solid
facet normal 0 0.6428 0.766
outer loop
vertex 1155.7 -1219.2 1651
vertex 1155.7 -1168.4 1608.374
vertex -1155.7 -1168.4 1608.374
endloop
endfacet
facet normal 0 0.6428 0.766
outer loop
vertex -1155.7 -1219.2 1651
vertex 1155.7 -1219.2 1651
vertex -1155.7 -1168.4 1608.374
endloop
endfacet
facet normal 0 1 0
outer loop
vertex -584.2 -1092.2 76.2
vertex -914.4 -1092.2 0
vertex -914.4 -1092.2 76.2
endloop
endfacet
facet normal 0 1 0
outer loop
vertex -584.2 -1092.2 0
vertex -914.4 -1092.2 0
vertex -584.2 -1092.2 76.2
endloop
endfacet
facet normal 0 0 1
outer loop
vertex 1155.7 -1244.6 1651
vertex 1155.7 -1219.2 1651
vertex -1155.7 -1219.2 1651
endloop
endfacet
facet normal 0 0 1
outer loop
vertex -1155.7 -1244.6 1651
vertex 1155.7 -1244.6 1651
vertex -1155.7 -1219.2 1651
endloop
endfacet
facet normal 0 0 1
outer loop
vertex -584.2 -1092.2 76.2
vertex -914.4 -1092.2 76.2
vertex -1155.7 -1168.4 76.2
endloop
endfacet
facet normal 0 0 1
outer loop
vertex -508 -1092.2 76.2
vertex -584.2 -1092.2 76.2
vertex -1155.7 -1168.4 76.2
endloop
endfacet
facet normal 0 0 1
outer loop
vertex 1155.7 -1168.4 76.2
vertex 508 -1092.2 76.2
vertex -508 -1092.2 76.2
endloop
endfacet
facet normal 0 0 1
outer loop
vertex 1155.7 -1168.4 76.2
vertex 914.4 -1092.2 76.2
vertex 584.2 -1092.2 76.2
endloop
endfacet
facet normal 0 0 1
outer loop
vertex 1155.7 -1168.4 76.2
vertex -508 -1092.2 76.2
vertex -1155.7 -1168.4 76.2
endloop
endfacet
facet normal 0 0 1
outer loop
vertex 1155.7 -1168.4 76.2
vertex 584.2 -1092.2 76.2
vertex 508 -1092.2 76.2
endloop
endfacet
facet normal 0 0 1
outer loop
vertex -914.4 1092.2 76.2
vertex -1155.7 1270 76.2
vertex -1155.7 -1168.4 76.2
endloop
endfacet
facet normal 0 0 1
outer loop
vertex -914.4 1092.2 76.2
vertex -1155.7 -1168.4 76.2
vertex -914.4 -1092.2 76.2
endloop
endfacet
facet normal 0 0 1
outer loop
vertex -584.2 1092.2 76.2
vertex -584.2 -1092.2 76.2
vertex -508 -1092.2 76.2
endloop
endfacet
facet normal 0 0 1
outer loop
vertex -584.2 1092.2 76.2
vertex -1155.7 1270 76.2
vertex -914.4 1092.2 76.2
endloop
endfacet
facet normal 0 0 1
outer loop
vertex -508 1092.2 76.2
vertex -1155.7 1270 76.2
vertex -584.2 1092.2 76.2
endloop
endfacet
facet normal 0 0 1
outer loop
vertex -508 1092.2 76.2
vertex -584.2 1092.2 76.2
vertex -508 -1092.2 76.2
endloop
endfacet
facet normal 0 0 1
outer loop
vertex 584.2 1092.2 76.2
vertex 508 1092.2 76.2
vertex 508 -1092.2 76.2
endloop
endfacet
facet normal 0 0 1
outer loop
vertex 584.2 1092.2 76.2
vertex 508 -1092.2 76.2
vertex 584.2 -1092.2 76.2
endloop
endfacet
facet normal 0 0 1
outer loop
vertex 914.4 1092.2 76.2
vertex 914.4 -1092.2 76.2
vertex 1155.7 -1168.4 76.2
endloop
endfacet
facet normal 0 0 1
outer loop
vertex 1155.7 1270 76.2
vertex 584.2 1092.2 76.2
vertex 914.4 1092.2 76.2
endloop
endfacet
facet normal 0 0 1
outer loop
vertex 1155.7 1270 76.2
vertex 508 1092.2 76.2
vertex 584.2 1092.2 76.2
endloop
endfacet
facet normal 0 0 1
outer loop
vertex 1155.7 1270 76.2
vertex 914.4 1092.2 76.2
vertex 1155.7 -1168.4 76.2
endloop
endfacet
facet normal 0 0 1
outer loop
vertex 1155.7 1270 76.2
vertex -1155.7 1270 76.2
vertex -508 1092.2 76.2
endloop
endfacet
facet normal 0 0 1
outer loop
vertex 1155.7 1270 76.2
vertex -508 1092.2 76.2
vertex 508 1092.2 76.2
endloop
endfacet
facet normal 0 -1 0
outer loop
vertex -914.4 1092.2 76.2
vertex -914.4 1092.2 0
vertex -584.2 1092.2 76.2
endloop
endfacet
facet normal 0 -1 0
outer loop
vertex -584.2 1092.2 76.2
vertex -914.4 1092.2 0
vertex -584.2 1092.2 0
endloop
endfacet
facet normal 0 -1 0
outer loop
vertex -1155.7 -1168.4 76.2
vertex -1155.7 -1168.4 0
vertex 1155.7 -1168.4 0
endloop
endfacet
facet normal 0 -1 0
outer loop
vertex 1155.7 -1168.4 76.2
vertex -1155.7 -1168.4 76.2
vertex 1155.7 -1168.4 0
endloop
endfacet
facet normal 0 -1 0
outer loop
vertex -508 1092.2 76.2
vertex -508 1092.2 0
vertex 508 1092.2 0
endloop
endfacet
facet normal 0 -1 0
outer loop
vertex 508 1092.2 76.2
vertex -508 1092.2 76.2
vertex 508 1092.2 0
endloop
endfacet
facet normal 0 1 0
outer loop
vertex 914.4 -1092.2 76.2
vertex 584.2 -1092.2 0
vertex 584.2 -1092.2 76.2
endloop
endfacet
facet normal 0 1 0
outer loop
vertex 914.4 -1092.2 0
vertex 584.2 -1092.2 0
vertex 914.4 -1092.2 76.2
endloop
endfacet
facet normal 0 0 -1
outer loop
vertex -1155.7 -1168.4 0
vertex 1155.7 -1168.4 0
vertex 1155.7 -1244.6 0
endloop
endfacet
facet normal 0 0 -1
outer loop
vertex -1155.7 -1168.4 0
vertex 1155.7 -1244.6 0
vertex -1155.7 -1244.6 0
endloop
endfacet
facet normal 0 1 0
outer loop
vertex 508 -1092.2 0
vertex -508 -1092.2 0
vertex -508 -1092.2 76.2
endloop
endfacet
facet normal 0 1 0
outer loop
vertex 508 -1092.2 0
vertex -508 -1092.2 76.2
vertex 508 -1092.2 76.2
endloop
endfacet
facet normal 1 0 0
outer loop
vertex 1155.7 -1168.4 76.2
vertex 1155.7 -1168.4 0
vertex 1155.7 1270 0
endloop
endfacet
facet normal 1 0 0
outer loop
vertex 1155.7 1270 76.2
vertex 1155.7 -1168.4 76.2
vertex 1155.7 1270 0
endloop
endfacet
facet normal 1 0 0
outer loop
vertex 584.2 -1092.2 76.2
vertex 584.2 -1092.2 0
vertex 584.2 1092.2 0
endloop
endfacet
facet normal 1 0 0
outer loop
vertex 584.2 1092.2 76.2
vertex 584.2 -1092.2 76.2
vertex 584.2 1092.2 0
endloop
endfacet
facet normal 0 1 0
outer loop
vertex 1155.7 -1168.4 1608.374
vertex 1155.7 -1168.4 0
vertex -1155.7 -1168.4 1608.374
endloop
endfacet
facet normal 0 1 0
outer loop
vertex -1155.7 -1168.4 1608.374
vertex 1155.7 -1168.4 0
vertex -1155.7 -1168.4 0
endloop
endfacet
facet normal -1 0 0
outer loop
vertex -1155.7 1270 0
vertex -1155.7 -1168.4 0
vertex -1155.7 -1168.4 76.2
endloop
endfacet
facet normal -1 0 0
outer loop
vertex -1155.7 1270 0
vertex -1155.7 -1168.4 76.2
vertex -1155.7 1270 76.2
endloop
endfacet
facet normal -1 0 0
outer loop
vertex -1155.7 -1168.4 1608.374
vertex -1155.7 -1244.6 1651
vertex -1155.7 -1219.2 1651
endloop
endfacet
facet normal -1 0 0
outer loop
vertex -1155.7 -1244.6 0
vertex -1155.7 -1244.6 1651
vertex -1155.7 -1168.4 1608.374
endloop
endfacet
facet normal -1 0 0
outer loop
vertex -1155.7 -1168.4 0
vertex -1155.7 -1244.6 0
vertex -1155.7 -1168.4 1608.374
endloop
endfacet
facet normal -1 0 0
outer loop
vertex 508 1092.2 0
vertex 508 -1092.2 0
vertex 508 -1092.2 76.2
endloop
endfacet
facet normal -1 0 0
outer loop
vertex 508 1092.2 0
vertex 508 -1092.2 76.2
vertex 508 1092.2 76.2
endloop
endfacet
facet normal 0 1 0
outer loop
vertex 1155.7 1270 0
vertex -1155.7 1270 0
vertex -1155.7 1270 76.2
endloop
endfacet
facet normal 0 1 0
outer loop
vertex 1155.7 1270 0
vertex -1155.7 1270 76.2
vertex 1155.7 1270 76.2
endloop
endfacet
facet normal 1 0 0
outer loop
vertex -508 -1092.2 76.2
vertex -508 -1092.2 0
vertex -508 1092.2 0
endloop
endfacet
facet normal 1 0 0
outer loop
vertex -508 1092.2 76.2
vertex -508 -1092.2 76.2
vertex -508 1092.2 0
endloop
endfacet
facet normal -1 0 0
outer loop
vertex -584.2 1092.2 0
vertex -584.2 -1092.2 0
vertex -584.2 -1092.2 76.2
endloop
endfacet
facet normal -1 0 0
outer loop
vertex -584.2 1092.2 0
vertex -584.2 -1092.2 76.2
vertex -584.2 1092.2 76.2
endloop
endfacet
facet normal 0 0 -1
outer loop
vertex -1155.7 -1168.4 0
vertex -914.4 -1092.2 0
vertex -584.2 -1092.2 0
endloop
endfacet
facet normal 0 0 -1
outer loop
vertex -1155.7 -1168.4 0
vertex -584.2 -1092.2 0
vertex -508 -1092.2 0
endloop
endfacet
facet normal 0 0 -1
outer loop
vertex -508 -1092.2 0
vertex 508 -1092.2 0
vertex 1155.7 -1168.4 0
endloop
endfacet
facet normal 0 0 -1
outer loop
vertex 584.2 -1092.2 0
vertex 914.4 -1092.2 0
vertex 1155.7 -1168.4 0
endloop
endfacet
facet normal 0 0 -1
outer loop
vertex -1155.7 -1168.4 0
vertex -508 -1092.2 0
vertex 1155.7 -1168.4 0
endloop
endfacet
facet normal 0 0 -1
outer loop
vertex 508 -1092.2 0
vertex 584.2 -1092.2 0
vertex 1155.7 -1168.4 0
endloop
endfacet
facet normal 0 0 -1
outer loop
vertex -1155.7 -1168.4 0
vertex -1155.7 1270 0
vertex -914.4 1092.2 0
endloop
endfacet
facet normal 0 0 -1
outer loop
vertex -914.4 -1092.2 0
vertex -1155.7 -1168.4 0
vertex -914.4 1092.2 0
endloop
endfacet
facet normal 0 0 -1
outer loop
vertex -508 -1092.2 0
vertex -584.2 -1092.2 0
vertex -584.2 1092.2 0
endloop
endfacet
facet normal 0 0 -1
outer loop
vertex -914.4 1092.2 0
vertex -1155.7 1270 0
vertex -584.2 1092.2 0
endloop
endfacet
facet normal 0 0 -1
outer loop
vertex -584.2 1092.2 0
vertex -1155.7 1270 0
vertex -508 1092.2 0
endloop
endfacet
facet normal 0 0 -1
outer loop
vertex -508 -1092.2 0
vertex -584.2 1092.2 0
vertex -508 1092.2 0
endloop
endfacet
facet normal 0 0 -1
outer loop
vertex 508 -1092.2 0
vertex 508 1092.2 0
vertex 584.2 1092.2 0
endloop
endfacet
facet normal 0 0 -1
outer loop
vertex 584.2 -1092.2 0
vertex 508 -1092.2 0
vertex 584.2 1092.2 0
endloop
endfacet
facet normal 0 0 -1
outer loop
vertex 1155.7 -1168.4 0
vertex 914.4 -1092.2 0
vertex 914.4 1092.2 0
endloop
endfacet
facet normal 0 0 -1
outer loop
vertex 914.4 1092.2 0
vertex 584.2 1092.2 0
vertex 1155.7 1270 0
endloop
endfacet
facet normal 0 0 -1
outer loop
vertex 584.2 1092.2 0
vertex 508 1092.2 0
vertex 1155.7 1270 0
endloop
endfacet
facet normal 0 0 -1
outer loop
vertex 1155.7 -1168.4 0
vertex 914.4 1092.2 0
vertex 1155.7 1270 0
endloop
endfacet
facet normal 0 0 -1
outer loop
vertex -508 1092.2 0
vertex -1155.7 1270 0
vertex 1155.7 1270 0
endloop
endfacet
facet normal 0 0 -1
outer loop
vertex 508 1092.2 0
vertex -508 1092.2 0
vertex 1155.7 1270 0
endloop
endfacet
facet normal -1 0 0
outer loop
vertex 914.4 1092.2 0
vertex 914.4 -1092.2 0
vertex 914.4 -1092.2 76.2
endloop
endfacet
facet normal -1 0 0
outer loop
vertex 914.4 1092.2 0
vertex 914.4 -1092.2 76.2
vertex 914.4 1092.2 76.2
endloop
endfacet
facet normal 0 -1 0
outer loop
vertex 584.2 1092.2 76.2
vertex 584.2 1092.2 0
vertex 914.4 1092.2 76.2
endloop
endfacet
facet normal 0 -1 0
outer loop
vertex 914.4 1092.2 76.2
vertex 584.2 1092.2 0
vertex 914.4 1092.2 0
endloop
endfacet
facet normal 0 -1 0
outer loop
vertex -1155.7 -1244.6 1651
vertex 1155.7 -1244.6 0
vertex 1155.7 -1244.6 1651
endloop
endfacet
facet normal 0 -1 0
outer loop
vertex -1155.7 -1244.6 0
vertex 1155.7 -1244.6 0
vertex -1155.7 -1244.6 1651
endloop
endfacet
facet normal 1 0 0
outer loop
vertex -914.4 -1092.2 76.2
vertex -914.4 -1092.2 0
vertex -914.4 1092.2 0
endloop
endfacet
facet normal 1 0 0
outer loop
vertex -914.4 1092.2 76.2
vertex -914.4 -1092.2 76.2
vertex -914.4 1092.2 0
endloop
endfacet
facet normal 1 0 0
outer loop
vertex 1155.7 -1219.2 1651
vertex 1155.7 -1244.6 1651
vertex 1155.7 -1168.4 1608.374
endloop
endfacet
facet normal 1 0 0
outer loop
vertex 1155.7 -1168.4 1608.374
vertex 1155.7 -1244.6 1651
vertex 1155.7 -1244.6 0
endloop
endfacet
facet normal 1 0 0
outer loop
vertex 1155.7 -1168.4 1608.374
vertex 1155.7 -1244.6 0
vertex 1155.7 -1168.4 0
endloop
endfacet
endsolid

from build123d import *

# Parameters (mm, degrees)
SKETCH1_W           = 2311.4
SKETCH1_H           = 2438.4
SKETCH1_W_2         = 1016
SKETCH1_H_2         = 2184.4
SKETCH1_W_3         = 330.2
BOSS_EXTRUDE1_DEPTH = 76.2
SKETCH2_W           = 2311.4
SKETCH2_H           = 76.2
BOSS_EXTRUDE2_DEPTH = 1651
CHAMFER1_SIZE       = 50.8
CHAMFER1_SIZE2      = 42.626261264


with BuildPart() as part:
    # Sketch1 → Boss-Extrude1 (new body)
    with BuildSketch(Plane.XY):
        with Locations((0, 50.8)):
            Rectangle(SKETCH1_W, SKETCH1_H)
        Rectangle(SKETCH1_W_2, SKETCH1_H_2, mode=Mode.SUBTRACT)
        with Locations((-749.3, 0)):
            Rectangle(SKETCH1_W_3, SKETCH1_H_2, mode=Mode.SUBTRACT)
        with Locations((749.3, 0)):
            Rectangle(SKETCH1_W_3, SKETCH1_H_2, mode=Mode.SUBTRACT)
    extrude(amount=BOSS_EXTRUDE1_DEPTH)


with BuildPart() as body_2:
    # Sketch2 → Boss-Extrude2 (new body)
    with BuildSketch(Plane(origin=(0, 0, 0), x_dir=(-1, 0, 0), z_dir=(0, 0, -1))):
        with Locations((0, -1206.5)):
            Rectangle(SKETCH2_W, SKETCH2_H)
    extrude(amount=-BOSS_EXTRUDE2_DEPTH)

    # Chamfer1
    chamfer1_edges = [body_2.edges().sort_by_distance(p)[0] for p in [
        (0, -1168.4, 1651),
    ]]
    chamfer1_side = [body_2.faces().sort_by_distance(p)[0] for p in [
        (0, -1206.5, 1651),
    ]]
    chamfer(chamfer1_edges, length=CHAMFER1_SIZE, length2=CHAMFER1_SIZE2, reference=chamfer1_side[0])


solid = Compound([part.part, body_2.part])
